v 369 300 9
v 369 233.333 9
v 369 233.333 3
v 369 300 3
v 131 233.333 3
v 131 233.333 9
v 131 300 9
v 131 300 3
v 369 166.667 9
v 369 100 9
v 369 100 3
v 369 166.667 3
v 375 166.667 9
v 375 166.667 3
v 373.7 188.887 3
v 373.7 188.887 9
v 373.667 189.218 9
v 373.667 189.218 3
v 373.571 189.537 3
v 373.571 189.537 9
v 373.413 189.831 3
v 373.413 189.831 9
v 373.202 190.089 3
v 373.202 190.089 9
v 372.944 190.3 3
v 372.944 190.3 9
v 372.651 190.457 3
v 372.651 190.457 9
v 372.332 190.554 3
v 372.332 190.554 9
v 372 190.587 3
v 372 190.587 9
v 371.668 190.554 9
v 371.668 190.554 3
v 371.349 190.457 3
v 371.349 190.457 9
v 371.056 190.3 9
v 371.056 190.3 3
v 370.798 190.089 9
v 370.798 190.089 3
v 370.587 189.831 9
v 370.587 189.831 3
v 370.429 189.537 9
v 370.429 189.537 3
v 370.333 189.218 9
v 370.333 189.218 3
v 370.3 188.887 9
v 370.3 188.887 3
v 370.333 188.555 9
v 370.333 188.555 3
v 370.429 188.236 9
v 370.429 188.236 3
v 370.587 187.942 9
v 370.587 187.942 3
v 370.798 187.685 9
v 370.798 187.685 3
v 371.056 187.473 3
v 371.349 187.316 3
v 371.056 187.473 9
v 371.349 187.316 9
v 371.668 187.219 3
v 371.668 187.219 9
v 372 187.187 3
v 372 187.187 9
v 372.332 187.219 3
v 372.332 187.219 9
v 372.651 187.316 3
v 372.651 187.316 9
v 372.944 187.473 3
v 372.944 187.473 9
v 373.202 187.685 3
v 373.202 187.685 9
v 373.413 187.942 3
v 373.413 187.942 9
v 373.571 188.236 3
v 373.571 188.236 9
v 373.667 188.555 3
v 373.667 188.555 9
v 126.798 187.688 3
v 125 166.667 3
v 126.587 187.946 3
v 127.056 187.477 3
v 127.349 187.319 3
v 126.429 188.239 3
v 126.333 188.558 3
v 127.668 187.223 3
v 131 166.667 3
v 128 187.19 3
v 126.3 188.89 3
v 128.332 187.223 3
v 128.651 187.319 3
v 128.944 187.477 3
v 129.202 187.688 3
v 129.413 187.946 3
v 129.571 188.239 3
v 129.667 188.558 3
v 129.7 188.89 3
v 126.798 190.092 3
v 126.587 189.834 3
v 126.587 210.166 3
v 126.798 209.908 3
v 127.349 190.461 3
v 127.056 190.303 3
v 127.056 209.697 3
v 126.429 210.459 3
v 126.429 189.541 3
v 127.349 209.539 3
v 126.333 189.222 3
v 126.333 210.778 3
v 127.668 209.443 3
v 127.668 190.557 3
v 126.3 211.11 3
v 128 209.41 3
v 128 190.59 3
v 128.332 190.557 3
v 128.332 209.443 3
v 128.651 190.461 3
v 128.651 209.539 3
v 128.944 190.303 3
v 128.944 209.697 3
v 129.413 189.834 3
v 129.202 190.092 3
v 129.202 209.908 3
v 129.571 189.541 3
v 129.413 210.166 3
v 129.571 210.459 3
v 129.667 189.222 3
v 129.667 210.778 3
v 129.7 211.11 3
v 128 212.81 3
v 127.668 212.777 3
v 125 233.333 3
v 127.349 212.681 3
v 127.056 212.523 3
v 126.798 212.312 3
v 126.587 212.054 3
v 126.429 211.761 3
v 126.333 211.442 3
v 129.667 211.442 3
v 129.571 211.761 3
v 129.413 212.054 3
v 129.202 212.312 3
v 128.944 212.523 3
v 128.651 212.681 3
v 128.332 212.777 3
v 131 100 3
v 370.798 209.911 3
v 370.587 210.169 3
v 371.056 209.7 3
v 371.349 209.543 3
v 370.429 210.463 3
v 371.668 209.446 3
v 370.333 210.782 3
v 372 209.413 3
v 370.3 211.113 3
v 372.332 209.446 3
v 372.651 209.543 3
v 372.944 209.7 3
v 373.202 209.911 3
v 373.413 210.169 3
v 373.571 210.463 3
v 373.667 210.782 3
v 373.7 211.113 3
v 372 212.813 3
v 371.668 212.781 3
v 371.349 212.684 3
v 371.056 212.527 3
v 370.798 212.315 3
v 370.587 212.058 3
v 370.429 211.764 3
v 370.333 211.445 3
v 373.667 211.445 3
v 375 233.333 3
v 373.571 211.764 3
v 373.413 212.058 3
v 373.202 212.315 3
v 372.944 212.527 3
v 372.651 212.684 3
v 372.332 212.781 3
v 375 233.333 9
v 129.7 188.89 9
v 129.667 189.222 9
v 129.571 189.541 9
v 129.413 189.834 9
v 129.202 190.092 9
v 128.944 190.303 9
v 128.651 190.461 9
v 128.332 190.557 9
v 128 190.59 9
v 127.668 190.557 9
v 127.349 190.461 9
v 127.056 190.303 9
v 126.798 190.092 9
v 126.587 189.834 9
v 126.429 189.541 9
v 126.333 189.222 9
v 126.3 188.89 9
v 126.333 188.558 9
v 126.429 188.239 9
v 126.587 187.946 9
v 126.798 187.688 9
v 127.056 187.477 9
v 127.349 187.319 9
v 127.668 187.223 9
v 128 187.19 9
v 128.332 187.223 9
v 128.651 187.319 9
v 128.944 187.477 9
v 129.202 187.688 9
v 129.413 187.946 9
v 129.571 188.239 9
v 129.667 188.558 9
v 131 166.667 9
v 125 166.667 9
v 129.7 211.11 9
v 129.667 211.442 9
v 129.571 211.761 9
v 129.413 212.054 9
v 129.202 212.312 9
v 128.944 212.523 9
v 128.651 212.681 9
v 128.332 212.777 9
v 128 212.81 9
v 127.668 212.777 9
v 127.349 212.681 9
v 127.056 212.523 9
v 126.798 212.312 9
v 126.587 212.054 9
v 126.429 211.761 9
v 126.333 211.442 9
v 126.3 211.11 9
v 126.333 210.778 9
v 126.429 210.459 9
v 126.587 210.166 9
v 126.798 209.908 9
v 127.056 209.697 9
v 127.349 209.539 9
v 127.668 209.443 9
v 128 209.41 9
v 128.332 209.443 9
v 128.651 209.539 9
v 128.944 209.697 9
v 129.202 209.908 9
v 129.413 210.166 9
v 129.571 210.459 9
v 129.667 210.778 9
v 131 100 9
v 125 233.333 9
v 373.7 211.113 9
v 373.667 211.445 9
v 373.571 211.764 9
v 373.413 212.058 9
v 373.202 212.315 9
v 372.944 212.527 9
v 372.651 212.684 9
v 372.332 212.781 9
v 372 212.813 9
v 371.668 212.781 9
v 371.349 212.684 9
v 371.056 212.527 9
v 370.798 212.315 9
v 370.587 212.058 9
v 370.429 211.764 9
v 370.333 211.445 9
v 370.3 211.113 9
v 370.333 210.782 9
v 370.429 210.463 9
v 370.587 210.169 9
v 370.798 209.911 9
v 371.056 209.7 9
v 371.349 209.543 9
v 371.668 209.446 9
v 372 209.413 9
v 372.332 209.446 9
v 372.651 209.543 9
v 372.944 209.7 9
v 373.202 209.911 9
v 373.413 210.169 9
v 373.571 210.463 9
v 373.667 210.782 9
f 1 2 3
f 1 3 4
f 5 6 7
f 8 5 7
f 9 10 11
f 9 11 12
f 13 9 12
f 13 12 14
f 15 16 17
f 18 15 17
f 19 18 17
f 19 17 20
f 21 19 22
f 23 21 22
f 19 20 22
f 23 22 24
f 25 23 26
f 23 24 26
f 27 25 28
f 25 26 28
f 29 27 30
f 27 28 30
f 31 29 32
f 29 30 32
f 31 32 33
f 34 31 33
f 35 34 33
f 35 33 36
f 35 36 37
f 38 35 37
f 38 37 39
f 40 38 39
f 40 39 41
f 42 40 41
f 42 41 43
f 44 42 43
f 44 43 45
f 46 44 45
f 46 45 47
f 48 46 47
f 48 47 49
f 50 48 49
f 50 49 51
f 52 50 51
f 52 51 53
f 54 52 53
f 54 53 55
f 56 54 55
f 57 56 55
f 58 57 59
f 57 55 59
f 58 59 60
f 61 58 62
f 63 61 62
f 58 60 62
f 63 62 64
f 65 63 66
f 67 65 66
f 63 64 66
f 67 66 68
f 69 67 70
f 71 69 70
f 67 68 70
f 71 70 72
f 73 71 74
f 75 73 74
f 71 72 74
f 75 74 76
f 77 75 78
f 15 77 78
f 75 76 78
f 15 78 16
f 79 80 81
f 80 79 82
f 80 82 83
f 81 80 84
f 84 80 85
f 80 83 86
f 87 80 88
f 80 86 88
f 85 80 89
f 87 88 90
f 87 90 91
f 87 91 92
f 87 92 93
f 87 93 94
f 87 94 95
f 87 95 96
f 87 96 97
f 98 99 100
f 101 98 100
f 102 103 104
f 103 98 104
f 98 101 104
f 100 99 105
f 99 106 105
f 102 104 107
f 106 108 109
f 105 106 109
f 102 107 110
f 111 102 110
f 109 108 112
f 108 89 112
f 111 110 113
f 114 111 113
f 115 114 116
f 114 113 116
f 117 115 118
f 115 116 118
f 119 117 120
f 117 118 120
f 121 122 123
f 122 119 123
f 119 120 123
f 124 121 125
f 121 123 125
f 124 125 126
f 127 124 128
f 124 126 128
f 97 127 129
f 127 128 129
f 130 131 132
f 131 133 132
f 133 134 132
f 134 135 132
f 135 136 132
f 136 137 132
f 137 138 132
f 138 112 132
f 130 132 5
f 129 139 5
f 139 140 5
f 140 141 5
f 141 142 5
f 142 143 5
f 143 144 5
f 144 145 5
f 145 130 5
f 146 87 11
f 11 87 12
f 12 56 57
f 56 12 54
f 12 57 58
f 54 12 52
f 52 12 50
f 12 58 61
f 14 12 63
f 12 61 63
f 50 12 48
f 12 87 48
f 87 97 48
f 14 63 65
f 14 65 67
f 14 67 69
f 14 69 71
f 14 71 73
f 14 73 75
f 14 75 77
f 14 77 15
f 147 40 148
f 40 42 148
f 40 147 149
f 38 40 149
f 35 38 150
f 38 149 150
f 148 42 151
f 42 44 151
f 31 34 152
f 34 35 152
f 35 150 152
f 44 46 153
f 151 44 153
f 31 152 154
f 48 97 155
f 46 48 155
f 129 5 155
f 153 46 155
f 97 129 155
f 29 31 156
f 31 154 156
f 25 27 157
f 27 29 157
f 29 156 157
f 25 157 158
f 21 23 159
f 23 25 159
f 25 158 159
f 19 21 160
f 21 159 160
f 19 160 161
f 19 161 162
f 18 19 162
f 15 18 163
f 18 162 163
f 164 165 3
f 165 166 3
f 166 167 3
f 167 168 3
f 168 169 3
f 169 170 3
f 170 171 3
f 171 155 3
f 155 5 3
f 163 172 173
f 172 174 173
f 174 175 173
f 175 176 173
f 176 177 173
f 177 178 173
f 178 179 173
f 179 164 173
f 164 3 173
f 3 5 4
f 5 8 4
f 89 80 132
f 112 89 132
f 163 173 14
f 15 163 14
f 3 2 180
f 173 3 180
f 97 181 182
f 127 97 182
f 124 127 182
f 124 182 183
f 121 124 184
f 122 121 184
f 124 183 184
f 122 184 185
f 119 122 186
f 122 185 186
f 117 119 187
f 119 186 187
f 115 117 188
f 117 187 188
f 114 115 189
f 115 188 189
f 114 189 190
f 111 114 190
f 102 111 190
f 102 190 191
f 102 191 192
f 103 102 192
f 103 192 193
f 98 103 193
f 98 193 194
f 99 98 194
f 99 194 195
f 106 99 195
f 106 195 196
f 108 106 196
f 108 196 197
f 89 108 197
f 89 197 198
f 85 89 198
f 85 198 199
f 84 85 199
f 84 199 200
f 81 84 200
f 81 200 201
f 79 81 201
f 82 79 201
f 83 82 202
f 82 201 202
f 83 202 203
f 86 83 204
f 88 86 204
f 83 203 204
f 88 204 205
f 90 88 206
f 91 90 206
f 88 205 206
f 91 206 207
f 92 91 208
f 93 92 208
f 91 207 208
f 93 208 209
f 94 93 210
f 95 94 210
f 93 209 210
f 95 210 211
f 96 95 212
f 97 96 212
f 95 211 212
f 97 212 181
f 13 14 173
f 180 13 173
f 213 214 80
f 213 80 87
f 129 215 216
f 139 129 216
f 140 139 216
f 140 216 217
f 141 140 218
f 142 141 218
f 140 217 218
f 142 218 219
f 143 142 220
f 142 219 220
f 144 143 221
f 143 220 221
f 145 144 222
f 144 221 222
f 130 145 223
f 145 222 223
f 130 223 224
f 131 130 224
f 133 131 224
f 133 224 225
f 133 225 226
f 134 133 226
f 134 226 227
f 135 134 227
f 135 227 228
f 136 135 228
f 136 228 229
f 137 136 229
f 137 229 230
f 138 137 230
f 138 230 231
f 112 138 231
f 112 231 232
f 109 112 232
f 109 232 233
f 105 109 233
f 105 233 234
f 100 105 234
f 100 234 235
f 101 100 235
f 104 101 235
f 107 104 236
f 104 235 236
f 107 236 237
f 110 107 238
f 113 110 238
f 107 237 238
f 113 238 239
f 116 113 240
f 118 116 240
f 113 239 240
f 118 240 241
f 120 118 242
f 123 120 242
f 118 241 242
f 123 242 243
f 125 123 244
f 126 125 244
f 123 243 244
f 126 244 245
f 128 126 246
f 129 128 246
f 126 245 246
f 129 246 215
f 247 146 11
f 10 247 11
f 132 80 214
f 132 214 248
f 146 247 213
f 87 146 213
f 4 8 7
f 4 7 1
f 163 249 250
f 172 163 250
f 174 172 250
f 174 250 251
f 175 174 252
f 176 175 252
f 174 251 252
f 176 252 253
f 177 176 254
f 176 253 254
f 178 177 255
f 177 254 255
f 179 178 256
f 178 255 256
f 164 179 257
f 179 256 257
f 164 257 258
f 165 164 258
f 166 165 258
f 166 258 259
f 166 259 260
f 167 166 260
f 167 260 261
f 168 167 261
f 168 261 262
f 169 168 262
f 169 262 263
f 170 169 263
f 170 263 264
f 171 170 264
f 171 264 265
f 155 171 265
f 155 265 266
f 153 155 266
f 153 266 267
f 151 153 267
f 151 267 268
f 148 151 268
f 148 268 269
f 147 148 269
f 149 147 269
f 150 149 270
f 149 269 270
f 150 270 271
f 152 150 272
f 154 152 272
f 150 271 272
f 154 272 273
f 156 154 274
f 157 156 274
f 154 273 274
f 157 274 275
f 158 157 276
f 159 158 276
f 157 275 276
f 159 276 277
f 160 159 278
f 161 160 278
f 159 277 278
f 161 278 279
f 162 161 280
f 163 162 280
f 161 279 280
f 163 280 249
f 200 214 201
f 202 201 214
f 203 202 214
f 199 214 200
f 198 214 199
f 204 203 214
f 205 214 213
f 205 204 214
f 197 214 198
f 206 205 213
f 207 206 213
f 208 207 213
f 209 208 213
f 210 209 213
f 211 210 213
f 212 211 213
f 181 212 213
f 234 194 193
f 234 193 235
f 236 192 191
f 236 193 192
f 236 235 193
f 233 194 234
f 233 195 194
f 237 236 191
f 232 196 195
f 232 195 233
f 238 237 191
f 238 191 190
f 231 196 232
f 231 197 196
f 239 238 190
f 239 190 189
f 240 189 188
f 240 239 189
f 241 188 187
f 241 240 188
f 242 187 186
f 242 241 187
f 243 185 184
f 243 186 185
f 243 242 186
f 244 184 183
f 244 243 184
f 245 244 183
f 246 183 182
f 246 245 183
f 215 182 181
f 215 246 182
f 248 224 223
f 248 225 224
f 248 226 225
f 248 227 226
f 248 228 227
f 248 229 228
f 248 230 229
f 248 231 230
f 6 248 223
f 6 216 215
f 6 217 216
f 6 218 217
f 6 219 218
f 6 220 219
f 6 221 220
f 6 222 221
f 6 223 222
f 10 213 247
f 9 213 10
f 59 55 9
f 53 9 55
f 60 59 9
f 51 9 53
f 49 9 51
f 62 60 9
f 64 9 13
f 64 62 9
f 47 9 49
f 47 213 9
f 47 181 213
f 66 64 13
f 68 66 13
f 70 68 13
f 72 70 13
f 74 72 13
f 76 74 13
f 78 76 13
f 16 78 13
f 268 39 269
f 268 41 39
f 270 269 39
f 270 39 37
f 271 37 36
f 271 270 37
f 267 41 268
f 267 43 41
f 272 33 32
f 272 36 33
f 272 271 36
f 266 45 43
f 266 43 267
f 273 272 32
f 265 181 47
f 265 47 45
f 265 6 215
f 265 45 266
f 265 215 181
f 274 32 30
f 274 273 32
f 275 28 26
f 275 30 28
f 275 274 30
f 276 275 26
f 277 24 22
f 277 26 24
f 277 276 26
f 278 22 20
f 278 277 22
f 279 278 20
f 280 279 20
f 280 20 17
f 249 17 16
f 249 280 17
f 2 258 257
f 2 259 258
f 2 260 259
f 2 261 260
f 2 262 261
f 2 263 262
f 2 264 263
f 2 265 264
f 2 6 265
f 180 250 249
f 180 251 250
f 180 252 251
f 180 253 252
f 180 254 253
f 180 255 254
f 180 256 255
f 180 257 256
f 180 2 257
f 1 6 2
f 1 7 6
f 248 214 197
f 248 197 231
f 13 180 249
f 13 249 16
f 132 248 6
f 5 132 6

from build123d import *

# Parameters (mm, degrees)
SKETCH1_W            = 500
SKETCH1_H            = 400
BOSS_EXTRUDE1_DEPTH  = 12
SKETCH2_W            = 12
SKETCH2_H            = 133.333333333
CUT_EXTRUDE1_DEPTH   = 12
SCALE1_SCALE         = 0.5
M3_CLEARANCE_SLOT1_D = 3.4


with BuildPart() as part:
    # Sketch1 → Boss-Extrude1 (new body)
    with BuildSketch(Plane.XY):
        with Locations((250, 200)):
            Rectangle(SKETCH1_W, SKETCH1_H)
    extrude(amount=BOSS_EXTRUDE1_DEPTH)

    # Sketch2 → Cut-Extrude1 (cut)
    with BuildSketch(Plane.XY.offset(12)):
        with Locations((494, 333.333333334)):
            Rectangle(SKETCH2_W, SKETCH2_H)
        with Locations((6, 333.333333334)):
            Rectangle(SKETCH2_W, SKETCH2_H)
        with Locations((6, 66.666666667)):
            Rectangle(SKETCH2_W, SKETCH2_H)
        with Locations((494, 66.666666667)):
            Rectangle(SKETCH2_W, SKETCH2_H)
    extrude(amount=-CUT_EXTRUDE1_DEPTH, mode=Mode.SUBTRACT)


with BuildPart() as part_1:
    # Scale1: scaled about (250, 200, 6)
    add(part.part.scale(SCALE1_SCALE).moved(Location((125, 100, 3))))

    # M3 Clearance Slot1 (through all)
    with Locations(Plane(origin=(0, 0, 3), x_dir=(-1, 0, 0), z_dir=(0, 0, -1))):
        with Locations((-372, 211.113333333), (-372, 188.886666667), (-128, 211.11), (-128, 188.89)):
            Hole(M3_CLEARANCE_SLOT1_D / 2)


solid = part_1.part
